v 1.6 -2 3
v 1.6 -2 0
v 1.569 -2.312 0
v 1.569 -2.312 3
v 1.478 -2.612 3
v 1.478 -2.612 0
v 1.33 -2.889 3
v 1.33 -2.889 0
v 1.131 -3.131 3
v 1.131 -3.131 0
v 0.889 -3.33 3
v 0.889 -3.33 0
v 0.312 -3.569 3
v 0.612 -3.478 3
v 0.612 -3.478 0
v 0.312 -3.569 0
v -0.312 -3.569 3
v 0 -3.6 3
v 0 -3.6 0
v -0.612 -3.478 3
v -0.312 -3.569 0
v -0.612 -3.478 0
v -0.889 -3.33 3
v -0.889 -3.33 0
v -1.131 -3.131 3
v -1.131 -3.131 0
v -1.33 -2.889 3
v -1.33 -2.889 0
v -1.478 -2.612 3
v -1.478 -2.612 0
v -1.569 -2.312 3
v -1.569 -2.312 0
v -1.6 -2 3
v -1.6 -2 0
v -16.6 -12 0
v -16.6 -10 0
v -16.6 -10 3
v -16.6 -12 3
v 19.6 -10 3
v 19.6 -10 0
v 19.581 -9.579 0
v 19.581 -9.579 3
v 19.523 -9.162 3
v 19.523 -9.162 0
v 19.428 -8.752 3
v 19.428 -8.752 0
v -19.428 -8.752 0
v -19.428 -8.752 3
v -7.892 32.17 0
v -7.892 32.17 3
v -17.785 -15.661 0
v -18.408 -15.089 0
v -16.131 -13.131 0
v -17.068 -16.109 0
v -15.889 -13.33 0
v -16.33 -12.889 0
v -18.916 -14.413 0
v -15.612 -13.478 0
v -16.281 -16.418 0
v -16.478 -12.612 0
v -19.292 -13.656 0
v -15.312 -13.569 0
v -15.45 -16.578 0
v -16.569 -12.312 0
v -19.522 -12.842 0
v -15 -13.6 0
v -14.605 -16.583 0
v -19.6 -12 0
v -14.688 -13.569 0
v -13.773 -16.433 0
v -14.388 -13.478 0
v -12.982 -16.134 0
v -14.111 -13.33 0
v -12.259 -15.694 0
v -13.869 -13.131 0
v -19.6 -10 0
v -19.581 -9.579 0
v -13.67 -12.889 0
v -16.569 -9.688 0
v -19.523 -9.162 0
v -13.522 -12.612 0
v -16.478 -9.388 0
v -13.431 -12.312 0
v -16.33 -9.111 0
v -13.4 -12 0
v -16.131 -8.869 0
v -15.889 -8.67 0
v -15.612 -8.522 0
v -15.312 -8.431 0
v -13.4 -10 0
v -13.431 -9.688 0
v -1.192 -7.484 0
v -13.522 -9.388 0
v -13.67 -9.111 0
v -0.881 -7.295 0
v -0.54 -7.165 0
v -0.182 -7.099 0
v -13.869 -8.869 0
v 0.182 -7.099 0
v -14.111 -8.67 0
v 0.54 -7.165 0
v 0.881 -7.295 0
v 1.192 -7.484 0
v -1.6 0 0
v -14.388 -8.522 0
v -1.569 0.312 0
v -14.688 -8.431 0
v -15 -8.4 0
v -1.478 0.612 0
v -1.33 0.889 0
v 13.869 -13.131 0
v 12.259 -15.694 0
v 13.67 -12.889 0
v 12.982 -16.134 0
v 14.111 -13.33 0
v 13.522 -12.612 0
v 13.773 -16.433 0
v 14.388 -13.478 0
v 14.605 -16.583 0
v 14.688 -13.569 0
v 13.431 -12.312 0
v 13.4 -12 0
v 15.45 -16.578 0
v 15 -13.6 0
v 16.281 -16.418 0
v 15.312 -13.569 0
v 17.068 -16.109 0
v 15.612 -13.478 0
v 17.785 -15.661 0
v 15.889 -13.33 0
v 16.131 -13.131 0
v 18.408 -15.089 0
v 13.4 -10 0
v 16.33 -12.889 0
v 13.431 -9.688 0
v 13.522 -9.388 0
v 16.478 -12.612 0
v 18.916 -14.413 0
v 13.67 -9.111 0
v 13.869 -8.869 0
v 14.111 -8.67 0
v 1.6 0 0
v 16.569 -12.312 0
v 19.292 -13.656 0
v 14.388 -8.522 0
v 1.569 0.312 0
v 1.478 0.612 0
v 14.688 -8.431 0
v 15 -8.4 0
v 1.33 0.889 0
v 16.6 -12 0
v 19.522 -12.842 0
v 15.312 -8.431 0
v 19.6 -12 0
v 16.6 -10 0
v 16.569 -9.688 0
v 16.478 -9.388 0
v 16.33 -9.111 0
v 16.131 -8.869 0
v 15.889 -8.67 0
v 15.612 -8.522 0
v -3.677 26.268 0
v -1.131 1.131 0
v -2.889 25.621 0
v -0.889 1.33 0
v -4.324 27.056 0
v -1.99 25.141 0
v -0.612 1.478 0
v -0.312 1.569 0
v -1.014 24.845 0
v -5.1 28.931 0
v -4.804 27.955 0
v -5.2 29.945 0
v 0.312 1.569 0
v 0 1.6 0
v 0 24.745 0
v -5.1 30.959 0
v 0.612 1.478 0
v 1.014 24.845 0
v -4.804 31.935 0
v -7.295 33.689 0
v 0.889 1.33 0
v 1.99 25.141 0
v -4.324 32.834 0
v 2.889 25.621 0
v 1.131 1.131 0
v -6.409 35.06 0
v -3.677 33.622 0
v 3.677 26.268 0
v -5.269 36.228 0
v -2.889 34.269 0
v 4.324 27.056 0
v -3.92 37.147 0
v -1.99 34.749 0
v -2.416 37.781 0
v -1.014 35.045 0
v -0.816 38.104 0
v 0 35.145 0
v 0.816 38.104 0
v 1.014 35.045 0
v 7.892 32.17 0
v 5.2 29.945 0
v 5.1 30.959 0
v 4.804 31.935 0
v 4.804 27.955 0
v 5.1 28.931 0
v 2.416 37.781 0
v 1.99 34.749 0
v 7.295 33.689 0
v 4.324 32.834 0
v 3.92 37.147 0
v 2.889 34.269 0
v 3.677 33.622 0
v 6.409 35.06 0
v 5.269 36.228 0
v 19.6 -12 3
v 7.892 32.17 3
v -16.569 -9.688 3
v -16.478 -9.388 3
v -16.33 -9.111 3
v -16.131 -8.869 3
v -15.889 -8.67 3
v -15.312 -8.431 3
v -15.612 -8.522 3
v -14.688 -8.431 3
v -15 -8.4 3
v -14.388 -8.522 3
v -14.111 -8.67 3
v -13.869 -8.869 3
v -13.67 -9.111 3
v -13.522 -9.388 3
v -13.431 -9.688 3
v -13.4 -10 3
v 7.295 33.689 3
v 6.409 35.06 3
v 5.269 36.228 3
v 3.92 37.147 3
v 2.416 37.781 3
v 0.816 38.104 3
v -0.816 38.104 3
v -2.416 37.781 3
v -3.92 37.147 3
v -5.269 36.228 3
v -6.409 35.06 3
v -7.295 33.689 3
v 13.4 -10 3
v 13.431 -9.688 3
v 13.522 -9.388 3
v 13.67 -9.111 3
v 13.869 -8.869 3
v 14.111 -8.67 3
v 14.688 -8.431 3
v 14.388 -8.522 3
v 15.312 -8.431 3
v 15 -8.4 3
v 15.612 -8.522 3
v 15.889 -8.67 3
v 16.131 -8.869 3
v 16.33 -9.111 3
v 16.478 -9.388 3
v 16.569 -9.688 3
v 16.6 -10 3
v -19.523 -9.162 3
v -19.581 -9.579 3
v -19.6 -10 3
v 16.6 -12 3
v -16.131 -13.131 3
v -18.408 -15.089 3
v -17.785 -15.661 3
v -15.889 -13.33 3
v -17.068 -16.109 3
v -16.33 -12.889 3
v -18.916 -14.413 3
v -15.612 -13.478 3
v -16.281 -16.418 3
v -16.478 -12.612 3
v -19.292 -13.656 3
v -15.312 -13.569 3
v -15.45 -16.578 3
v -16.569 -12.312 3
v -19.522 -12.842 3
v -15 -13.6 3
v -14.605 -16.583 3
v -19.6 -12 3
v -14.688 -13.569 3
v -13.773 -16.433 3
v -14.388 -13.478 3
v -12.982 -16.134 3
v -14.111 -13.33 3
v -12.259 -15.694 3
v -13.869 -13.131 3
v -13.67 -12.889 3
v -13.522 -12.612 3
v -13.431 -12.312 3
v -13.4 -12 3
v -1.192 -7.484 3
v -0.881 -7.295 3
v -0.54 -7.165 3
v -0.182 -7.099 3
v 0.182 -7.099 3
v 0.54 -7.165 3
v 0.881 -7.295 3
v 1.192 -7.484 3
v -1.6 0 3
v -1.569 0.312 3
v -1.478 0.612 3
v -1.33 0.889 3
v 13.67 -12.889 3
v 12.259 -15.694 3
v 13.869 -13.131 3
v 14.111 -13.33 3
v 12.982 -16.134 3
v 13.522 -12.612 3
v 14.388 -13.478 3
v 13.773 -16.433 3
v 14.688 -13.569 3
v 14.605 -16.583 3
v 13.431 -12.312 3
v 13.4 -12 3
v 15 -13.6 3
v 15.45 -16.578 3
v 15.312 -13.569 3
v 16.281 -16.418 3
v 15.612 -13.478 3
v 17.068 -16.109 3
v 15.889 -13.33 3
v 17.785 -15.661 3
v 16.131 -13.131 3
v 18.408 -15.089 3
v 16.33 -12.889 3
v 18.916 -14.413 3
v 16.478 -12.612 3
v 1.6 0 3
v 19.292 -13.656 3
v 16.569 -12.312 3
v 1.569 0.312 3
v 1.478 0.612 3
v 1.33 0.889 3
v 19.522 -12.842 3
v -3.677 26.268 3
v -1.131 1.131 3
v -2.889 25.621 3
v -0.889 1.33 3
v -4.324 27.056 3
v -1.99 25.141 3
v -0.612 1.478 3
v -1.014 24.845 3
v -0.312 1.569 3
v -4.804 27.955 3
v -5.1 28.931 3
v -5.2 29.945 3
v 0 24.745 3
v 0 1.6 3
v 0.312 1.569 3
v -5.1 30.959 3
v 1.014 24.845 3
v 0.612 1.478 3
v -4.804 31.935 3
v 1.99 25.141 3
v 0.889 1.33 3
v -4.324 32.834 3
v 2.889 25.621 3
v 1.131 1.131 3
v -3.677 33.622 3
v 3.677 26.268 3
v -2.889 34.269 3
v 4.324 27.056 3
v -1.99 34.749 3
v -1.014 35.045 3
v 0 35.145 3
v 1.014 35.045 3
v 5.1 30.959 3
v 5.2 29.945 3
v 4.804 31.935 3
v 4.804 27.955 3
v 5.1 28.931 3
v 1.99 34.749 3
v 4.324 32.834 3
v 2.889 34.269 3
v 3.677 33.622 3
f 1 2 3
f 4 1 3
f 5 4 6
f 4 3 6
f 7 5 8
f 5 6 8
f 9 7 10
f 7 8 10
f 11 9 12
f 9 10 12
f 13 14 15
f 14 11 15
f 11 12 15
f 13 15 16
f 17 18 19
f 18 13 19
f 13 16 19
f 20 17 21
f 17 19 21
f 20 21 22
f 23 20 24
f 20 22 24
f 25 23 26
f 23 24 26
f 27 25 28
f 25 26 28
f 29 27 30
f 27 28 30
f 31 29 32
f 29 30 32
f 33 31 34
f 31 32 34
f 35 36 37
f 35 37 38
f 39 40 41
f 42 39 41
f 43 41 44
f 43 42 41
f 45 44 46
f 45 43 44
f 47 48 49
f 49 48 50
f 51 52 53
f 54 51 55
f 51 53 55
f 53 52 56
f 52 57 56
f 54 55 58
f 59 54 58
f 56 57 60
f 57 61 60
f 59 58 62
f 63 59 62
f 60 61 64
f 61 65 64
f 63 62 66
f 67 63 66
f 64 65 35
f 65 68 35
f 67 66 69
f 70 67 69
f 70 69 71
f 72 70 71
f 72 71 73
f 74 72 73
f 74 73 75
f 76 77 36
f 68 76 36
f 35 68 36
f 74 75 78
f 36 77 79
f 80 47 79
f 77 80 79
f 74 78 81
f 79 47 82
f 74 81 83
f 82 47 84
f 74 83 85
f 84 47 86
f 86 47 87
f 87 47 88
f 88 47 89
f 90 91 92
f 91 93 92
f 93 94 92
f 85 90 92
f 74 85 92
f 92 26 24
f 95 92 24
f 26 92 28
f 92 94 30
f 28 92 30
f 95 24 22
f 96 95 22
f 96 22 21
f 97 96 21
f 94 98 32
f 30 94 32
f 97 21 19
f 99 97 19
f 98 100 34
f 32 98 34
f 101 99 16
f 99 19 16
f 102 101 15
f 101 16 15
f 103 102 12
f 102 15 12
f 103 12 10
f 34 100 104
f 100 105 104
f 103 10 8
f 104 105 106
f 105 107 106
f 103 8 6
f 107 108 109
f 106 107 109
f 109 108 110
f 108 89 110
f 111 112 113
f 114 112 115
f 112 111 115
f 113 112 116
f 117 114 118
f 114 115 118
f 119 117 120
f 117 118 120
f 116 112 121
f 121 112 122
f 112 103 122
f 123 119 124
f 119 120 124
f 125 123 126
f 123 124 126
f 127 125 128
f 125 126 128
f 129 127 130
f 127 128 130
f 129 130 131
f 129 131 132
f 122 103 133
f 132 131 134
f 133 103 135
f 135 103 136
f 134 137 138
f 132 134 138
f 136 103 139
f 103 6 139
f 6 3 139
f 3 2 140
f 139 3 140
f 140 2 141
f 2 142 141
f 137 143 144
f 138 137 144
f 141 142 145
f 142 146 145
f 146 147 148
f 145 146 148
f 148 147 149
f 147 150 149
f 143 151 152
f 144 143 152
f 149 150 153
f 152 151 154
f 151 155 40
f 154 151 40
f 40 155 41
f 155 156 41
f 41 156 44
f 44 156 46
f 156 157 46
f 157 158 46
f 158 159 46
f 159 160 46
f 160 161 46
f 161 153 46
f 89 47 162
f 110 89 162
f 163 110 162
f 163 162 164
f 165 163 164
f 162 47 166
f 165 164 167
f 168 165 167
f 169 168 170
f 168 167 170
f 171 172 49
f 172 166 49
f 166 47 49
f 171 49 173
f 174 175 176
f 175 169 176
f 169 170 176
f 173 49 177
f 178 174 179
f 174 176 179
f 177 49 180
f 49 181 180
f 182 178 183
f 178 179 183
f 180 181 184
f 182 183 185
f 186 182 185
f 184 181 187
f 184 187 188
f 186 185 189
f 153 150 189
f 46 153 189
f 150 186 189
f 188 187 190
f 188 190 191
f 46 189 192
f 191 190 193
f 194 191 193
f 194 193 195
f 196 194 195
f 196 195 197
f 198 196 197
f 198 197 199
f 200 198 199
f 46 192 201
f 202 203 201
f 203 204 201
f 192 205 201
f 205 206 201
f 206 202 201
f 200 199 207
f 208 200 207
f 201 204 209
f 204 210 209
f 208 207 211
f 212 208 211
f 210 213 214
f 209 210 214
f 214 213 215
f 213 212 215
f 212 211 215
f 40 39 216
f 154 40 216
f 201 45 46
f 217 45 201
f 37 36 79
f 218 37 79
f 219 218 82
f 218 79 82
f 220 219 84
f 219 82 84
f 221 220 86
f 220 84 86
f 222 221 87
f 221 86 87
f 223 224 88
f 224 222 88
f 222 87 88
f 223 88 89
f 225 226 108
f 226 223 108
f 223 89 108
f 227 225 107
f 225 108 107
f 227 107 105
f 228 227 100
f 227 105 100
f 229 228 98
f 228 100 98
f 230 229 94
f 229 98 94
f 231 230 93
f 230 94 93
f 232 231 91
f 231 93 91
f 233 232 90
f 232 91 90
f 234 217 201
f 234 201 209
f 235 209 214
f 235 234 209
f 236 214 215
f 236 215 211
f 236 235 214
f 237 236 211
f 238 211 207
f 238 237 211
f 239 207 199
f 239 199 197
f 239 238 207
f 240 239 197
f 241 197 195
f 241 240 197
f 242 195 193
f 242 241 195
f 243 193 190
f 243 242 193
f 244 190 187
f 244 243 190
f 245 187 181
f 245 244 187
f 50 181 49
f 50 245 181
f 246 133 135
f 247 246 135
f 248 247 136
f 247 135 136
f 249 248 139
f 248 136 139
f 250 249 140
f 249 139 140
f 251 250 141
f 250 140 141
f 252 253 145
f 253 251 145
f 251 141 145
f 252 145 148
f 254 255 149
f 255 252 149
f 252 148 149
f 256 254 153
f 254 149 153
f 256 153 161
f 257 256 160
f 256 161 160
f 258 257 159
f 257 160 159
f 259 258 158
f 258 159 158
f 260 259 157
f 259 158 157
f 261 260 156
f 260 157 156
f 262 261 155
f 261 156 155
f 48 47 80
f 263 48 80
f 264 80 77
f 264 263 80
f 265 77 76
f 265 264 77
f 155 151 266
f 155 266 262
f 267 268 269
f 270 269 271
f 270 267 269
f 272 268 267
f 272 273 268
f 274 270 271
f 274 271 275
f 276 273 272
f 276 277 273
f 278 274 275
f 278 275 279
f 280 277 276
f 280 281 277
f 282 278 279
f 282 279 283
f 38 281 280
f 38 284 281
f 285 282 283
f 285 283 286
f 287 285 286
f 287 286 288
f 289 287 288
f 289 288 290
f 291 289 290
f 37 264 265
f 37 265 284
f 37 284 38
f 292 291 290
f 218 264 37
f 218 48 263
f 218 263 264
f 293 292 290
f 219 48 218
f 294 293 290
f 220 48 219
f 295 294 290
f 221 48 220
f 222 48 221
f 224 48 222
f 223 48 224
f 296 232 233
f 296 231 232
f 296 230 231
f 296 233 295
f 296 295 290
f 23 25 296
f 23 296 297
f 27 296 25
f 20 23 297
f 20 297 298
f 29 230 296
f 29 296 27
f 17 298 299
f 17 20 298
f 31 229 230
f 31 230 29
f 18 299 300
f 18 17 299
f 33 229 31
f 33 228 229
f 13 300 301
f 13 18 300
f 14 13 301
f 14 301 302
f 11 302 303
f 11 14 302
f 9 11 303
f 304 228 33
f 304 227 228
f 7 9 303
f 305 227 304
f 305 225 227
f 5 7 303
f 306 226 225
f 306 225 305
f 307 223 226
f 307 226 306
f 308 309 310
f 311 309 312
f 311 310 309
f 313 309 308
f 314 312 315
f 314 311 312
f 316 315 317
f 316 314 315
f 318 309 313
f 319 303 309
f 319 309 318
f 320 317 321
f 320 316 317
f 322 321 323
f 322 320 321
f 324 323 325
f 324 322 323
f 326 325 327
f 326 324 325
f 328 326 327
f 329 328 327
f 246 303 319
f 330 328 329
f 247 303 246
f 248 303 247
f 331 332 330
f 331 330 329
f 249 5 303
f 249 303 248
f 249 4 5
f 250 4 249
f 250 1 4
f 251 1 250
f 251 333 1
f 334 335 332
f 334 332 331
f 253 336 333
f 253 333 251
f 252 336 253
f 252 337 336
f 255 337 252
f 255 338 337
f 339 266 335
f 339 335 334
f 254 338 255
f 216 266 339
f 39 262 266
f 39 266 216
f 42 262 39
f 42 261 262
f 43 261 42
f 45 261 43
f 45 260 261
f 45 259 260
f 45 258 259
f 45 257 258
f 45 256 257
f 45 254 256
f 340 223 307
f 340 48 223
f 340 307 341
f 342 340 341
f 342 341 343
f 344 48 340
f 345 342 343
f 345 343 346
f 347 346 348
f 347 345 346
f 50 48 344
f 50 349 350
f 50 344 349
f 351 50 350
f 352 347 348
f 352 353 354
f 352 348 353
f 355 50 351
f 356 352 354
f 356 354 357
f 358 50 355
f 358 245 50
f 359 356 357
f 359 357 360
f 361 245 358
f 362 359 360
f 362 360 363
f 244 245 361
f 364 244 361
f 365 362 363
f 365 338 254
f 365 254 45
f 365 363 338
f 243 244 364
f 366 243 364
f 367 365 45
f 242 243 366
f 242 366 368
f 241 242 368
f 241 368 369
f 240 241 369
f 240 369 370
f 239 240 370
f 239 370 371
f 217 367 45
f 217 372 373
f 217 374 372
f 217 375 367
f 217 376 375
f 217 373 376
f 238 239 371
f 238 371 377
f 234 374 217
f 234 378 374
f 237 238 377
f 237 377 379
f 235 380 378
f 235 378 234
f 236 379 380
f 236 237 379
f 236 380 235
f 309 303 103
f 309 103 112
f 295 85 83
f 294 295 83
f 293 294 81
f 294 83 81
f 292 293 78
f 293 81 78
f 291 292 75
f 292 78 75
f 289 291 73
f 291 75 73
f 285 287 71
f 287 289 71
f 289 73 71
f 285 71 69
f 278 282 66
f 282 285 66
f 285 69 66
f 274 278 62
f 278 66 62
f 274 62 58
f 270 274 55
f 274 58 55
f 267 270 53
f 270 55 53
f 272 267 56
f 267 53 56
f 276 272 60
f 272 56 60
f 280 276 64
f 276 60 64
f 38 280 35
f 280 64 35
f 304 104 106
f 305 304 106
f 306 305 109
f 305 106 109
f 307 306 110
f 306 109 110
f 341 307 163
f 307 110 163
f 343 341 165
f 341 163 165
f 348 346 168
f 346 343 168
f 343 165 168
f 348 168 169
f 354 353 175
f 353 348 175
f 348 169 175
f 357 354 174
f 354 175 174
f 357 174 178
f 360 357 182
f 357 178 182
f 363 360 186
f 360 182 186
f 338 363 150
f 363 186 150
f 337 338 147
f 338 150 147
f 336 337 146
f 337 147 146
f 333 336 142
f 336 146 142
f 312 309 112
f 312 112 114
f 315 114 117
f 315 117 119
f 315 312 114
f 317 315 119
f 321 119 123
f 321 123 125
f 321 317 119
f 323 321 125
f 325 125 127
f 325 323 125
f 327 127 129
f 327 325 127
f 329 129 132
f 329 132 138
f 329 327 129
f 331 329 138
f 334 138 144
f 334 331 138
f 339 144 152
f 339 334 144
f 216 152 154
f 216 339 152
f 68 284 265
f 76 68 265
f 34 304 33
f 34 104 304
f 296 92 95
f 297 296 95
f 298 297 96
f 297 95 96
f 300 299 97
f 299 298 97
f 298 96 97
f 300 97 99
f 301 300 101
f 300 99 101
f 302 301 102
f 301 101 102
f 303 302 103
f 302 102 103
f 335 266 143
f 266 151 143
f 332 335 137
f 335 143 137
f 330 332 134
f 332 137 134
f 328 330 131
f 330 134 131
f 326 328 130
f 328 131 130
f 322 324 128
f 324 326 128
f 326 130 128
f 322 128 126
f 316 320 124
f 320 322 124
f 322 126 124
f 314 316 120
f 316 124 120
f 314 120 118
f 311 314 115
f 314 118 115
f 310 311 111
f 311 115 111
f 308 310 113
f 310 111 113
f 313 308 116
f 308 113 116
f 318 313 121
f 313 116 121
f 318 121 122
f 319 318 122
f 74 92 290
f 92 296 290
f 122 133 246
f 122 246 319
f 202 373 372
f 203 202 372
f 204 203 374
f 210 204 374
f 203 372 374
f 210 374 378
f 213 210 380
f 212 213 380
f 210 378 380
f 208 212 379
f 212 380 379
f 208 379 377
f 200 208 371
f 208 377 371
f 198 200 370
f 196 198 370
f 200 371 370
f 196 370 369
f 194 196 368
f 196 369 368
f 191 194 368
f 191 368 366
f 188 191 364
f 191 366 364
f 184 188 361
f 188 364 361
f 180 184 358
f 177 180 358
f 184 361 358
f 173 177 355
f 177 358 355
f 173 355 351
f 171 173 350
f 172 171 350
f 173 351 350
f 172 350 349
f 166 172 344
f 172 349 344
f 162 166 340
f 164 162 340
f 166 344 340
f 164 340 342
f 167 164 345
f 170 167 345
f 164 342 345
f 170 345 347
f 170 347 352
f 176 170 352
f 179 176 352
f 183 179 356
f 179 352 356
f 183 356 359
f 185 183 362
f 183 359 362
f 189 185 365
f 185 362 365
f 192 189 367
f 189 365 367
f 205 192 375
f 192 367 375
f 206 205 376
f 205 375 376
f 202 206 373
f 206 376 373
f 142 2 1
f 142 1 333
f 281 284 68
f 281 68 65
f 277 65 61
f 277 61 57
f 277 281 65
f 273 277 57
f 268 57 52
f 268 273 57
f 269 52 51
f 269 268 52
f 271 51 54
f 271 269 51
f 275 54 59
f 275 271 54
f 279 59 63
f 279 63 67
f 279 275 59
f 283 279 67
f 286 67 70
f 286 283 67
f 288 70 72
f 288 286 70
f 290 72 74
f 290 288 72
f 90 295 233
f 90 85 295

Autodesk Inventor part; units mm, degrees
ref_plane "YZ Plane" through (0, 0, 0) normal (1, 0, 0) x (0, 1, 0)
ref_plane "XZ Plane" through (0, 0, 0) normal (0, 1, 0) x (-1, 0, 0)
ref_plane "XY Plane" through (0, 0, 0) normal (0, 0, 1) x (1, 0, 0)
sketch "スケッチ1" plane through (0, 0, 0) normal (0, 0, 1) x (1, 0, 0)
  line L0 (0, 0) -> (0, -2) construction
  line L1 (-1.6, 0) -> (-1.6, -2)
  line L2 (1.6, -2) -> (1.6, 0)
  arc A0 (1.6, 0) -> (-1.6, 0) centre (0, 0) ccw
  arc A1 (-1.6, -2) -> (1.6, -2) centre (0, -2) ccw
  line L3 (-30, -50) -> (30, -50)
  line L4 (30, -50) -> (30, 50)
  line L5 (30, 50) -> (-30, 50)
  line L6 (-30, 50) -> (-30, -50)
  line L7 (-30, -50) -> (30, 50) construction
  line L8 (30, -50) -> (-30, 50) construction
  line L9 (15, -10) -> (-15, -10) construction
  line L10 (15, -10) -> (15, -12) construction
  line L11 (13.4, -10) -> (13.4, -12)
  line L12 (16.6, -12) -> (16.6, -10)
  arc A2 (16.6, -10) -> (13.4, -10) centre (15, -10) ccw
  arc A3 (13.4, -12) -> (16.6, -12) centre (15, -12) ccw
  line L13 (-15, -10) -> (-15, -12) construction
  line L14 (-16.6, -10) -> (-16.6, -12)
  line L15 (-13.4, -12) -> (-13.4, -10)
  arc A4 (-13.4, -10) -> (-16.6, -10) centre (-15, -10) ccw
  arc A5 (-16.6, -12) -> (-13.4, -12) centre (-15, -12) ccw
  point P0 (0, -1)
  point P1 (15, -11)
  point P2 (-15, -11)
  point P3 (0, -10)
  dimension "d0" = 3.2
  dimension "d1" = 60
  dimension "d2" = 100
  dimension "d5" = 30
  dimension "d6" = 10
  dimension "d7" = 2
extrude "押し出し1" add sketch "スケッチ1" along normal blind 3
sketch "スケッチ2" plane through (0, 0, 3) normal (0, 0, 1) x (1, 0, 0)
  arc A0 (2.0211, 340.4082) -> (8.8067, 38.5424) centre (32.0275, 190.0735) ccw projected
  circle A1 centre (0, 29.945) radius 10 construction
  circle A2 centre (0, 29.945) radius 5.2
  arc A3 (-13.4, -10) -> (-16.6, -10) centre (-15, -10) ccw projected
  line L0 (-13.4, -10) -> (-13.4, -12) projected
  arc A4 (-16.6, -12) -> (-13.4, -12) centre (-15, -12) ccw projected
  line L1 (-16.6, -12) -> (-16.6, -10) projected
  arc A5 (16.6, -10) -> (13.4, -10) centre (15, -10) ccw projected
  line L2 (16.6, -10) -> (16.6, -12) projected
  arc A6 (13.4, -12) -> (16.6, -12) centre (15, -12) ccw projected
  line L3 (13.4, -12) -> (13.4, -10) projected
  arc A7 (1.6, 0) -> (-1.6, 0) centre (0, 0) ccw projected
  line L4 (1.6, 0) -> (1.6, -2) projected
  arc A8 (-1.6, -2) -> (1.6, -2) centre (0, -2) ccw projected
  line L5 (-1.6, -2) -> (-1.6, 0) projected
  line L6 (-30, -50) -> (30, -50) projected
  line L7 (30, -50) -> (30, 50) projected
  line L8 (30, 50) -> (-30, 50) projected
  line L9 (-30, 50) -> (-30, -50) projected
  arc A9 (19.6, -10) -> (19.4275, -8.752) centre (15, -10) ccw
  line L10 (19.6, -10) -> (19.6, -12)
  arc A10 (12.2593, -15.6944) -> (19.6, -12) centre (15, -12) ccw
  line L11 (10.4, -12) -> (10.4, -10)
  line L12 (4.6, -2) -> (4.6, 0)
  arc A11 (4.6, 0) -> (-4.6, 0) centre (0, 0) ccw
  line L13 (-4.6, 0) -> (-4.6, -2)
  arc A12 (-4.6, -2) -> (4.6, -2) centre (0, -2) ccw
  arc A13 (-19.4275, -8.752) -> (-19.6, -10) centre (-15, -10) ccw
  line L14 (-10.4, -10) -> (-10.4, -12)
  arc A14 (-19.6, -12) -> (-12.2593, -15.6944) centre (-15, -12) ccw
  line L15 (-19.6, -12) -> (-19.6, -10)
  arc A15 (7.8924, 32.1697) -> (-7.8924, 32.1697) centre (0, 29.945) ccw
  line L16 (19.4275, -8.752) -> (7.8924, 32.1697)
  line L17 (-19.4275, -8.752) -> (-7.8924, 32.1697)
  line L18 (0, -6.6) -> (12.2593, -15.6944)
  line L19 (0, -6.6) -> (-12.2593, -15.6944)
  dimension "d8" = 20
  dimension "d9" = 10.4
  dimension "d10" = 3
  dimension "d11" = 3
  dimension "d12" = 3
  dimension "d13" = 3
extrude "押し出し2" cut sketch "スケッチ2" against normal blind 3 contours A12 L13 A11 L12 | L10 A10 L18 L19 A14 L15 A13 L17 A15 L16 A9 keep common part
fillet "フィレット1" radius 2 1 edges at (0, -6.6, 1.5)
properties part number "POT2BASE"
